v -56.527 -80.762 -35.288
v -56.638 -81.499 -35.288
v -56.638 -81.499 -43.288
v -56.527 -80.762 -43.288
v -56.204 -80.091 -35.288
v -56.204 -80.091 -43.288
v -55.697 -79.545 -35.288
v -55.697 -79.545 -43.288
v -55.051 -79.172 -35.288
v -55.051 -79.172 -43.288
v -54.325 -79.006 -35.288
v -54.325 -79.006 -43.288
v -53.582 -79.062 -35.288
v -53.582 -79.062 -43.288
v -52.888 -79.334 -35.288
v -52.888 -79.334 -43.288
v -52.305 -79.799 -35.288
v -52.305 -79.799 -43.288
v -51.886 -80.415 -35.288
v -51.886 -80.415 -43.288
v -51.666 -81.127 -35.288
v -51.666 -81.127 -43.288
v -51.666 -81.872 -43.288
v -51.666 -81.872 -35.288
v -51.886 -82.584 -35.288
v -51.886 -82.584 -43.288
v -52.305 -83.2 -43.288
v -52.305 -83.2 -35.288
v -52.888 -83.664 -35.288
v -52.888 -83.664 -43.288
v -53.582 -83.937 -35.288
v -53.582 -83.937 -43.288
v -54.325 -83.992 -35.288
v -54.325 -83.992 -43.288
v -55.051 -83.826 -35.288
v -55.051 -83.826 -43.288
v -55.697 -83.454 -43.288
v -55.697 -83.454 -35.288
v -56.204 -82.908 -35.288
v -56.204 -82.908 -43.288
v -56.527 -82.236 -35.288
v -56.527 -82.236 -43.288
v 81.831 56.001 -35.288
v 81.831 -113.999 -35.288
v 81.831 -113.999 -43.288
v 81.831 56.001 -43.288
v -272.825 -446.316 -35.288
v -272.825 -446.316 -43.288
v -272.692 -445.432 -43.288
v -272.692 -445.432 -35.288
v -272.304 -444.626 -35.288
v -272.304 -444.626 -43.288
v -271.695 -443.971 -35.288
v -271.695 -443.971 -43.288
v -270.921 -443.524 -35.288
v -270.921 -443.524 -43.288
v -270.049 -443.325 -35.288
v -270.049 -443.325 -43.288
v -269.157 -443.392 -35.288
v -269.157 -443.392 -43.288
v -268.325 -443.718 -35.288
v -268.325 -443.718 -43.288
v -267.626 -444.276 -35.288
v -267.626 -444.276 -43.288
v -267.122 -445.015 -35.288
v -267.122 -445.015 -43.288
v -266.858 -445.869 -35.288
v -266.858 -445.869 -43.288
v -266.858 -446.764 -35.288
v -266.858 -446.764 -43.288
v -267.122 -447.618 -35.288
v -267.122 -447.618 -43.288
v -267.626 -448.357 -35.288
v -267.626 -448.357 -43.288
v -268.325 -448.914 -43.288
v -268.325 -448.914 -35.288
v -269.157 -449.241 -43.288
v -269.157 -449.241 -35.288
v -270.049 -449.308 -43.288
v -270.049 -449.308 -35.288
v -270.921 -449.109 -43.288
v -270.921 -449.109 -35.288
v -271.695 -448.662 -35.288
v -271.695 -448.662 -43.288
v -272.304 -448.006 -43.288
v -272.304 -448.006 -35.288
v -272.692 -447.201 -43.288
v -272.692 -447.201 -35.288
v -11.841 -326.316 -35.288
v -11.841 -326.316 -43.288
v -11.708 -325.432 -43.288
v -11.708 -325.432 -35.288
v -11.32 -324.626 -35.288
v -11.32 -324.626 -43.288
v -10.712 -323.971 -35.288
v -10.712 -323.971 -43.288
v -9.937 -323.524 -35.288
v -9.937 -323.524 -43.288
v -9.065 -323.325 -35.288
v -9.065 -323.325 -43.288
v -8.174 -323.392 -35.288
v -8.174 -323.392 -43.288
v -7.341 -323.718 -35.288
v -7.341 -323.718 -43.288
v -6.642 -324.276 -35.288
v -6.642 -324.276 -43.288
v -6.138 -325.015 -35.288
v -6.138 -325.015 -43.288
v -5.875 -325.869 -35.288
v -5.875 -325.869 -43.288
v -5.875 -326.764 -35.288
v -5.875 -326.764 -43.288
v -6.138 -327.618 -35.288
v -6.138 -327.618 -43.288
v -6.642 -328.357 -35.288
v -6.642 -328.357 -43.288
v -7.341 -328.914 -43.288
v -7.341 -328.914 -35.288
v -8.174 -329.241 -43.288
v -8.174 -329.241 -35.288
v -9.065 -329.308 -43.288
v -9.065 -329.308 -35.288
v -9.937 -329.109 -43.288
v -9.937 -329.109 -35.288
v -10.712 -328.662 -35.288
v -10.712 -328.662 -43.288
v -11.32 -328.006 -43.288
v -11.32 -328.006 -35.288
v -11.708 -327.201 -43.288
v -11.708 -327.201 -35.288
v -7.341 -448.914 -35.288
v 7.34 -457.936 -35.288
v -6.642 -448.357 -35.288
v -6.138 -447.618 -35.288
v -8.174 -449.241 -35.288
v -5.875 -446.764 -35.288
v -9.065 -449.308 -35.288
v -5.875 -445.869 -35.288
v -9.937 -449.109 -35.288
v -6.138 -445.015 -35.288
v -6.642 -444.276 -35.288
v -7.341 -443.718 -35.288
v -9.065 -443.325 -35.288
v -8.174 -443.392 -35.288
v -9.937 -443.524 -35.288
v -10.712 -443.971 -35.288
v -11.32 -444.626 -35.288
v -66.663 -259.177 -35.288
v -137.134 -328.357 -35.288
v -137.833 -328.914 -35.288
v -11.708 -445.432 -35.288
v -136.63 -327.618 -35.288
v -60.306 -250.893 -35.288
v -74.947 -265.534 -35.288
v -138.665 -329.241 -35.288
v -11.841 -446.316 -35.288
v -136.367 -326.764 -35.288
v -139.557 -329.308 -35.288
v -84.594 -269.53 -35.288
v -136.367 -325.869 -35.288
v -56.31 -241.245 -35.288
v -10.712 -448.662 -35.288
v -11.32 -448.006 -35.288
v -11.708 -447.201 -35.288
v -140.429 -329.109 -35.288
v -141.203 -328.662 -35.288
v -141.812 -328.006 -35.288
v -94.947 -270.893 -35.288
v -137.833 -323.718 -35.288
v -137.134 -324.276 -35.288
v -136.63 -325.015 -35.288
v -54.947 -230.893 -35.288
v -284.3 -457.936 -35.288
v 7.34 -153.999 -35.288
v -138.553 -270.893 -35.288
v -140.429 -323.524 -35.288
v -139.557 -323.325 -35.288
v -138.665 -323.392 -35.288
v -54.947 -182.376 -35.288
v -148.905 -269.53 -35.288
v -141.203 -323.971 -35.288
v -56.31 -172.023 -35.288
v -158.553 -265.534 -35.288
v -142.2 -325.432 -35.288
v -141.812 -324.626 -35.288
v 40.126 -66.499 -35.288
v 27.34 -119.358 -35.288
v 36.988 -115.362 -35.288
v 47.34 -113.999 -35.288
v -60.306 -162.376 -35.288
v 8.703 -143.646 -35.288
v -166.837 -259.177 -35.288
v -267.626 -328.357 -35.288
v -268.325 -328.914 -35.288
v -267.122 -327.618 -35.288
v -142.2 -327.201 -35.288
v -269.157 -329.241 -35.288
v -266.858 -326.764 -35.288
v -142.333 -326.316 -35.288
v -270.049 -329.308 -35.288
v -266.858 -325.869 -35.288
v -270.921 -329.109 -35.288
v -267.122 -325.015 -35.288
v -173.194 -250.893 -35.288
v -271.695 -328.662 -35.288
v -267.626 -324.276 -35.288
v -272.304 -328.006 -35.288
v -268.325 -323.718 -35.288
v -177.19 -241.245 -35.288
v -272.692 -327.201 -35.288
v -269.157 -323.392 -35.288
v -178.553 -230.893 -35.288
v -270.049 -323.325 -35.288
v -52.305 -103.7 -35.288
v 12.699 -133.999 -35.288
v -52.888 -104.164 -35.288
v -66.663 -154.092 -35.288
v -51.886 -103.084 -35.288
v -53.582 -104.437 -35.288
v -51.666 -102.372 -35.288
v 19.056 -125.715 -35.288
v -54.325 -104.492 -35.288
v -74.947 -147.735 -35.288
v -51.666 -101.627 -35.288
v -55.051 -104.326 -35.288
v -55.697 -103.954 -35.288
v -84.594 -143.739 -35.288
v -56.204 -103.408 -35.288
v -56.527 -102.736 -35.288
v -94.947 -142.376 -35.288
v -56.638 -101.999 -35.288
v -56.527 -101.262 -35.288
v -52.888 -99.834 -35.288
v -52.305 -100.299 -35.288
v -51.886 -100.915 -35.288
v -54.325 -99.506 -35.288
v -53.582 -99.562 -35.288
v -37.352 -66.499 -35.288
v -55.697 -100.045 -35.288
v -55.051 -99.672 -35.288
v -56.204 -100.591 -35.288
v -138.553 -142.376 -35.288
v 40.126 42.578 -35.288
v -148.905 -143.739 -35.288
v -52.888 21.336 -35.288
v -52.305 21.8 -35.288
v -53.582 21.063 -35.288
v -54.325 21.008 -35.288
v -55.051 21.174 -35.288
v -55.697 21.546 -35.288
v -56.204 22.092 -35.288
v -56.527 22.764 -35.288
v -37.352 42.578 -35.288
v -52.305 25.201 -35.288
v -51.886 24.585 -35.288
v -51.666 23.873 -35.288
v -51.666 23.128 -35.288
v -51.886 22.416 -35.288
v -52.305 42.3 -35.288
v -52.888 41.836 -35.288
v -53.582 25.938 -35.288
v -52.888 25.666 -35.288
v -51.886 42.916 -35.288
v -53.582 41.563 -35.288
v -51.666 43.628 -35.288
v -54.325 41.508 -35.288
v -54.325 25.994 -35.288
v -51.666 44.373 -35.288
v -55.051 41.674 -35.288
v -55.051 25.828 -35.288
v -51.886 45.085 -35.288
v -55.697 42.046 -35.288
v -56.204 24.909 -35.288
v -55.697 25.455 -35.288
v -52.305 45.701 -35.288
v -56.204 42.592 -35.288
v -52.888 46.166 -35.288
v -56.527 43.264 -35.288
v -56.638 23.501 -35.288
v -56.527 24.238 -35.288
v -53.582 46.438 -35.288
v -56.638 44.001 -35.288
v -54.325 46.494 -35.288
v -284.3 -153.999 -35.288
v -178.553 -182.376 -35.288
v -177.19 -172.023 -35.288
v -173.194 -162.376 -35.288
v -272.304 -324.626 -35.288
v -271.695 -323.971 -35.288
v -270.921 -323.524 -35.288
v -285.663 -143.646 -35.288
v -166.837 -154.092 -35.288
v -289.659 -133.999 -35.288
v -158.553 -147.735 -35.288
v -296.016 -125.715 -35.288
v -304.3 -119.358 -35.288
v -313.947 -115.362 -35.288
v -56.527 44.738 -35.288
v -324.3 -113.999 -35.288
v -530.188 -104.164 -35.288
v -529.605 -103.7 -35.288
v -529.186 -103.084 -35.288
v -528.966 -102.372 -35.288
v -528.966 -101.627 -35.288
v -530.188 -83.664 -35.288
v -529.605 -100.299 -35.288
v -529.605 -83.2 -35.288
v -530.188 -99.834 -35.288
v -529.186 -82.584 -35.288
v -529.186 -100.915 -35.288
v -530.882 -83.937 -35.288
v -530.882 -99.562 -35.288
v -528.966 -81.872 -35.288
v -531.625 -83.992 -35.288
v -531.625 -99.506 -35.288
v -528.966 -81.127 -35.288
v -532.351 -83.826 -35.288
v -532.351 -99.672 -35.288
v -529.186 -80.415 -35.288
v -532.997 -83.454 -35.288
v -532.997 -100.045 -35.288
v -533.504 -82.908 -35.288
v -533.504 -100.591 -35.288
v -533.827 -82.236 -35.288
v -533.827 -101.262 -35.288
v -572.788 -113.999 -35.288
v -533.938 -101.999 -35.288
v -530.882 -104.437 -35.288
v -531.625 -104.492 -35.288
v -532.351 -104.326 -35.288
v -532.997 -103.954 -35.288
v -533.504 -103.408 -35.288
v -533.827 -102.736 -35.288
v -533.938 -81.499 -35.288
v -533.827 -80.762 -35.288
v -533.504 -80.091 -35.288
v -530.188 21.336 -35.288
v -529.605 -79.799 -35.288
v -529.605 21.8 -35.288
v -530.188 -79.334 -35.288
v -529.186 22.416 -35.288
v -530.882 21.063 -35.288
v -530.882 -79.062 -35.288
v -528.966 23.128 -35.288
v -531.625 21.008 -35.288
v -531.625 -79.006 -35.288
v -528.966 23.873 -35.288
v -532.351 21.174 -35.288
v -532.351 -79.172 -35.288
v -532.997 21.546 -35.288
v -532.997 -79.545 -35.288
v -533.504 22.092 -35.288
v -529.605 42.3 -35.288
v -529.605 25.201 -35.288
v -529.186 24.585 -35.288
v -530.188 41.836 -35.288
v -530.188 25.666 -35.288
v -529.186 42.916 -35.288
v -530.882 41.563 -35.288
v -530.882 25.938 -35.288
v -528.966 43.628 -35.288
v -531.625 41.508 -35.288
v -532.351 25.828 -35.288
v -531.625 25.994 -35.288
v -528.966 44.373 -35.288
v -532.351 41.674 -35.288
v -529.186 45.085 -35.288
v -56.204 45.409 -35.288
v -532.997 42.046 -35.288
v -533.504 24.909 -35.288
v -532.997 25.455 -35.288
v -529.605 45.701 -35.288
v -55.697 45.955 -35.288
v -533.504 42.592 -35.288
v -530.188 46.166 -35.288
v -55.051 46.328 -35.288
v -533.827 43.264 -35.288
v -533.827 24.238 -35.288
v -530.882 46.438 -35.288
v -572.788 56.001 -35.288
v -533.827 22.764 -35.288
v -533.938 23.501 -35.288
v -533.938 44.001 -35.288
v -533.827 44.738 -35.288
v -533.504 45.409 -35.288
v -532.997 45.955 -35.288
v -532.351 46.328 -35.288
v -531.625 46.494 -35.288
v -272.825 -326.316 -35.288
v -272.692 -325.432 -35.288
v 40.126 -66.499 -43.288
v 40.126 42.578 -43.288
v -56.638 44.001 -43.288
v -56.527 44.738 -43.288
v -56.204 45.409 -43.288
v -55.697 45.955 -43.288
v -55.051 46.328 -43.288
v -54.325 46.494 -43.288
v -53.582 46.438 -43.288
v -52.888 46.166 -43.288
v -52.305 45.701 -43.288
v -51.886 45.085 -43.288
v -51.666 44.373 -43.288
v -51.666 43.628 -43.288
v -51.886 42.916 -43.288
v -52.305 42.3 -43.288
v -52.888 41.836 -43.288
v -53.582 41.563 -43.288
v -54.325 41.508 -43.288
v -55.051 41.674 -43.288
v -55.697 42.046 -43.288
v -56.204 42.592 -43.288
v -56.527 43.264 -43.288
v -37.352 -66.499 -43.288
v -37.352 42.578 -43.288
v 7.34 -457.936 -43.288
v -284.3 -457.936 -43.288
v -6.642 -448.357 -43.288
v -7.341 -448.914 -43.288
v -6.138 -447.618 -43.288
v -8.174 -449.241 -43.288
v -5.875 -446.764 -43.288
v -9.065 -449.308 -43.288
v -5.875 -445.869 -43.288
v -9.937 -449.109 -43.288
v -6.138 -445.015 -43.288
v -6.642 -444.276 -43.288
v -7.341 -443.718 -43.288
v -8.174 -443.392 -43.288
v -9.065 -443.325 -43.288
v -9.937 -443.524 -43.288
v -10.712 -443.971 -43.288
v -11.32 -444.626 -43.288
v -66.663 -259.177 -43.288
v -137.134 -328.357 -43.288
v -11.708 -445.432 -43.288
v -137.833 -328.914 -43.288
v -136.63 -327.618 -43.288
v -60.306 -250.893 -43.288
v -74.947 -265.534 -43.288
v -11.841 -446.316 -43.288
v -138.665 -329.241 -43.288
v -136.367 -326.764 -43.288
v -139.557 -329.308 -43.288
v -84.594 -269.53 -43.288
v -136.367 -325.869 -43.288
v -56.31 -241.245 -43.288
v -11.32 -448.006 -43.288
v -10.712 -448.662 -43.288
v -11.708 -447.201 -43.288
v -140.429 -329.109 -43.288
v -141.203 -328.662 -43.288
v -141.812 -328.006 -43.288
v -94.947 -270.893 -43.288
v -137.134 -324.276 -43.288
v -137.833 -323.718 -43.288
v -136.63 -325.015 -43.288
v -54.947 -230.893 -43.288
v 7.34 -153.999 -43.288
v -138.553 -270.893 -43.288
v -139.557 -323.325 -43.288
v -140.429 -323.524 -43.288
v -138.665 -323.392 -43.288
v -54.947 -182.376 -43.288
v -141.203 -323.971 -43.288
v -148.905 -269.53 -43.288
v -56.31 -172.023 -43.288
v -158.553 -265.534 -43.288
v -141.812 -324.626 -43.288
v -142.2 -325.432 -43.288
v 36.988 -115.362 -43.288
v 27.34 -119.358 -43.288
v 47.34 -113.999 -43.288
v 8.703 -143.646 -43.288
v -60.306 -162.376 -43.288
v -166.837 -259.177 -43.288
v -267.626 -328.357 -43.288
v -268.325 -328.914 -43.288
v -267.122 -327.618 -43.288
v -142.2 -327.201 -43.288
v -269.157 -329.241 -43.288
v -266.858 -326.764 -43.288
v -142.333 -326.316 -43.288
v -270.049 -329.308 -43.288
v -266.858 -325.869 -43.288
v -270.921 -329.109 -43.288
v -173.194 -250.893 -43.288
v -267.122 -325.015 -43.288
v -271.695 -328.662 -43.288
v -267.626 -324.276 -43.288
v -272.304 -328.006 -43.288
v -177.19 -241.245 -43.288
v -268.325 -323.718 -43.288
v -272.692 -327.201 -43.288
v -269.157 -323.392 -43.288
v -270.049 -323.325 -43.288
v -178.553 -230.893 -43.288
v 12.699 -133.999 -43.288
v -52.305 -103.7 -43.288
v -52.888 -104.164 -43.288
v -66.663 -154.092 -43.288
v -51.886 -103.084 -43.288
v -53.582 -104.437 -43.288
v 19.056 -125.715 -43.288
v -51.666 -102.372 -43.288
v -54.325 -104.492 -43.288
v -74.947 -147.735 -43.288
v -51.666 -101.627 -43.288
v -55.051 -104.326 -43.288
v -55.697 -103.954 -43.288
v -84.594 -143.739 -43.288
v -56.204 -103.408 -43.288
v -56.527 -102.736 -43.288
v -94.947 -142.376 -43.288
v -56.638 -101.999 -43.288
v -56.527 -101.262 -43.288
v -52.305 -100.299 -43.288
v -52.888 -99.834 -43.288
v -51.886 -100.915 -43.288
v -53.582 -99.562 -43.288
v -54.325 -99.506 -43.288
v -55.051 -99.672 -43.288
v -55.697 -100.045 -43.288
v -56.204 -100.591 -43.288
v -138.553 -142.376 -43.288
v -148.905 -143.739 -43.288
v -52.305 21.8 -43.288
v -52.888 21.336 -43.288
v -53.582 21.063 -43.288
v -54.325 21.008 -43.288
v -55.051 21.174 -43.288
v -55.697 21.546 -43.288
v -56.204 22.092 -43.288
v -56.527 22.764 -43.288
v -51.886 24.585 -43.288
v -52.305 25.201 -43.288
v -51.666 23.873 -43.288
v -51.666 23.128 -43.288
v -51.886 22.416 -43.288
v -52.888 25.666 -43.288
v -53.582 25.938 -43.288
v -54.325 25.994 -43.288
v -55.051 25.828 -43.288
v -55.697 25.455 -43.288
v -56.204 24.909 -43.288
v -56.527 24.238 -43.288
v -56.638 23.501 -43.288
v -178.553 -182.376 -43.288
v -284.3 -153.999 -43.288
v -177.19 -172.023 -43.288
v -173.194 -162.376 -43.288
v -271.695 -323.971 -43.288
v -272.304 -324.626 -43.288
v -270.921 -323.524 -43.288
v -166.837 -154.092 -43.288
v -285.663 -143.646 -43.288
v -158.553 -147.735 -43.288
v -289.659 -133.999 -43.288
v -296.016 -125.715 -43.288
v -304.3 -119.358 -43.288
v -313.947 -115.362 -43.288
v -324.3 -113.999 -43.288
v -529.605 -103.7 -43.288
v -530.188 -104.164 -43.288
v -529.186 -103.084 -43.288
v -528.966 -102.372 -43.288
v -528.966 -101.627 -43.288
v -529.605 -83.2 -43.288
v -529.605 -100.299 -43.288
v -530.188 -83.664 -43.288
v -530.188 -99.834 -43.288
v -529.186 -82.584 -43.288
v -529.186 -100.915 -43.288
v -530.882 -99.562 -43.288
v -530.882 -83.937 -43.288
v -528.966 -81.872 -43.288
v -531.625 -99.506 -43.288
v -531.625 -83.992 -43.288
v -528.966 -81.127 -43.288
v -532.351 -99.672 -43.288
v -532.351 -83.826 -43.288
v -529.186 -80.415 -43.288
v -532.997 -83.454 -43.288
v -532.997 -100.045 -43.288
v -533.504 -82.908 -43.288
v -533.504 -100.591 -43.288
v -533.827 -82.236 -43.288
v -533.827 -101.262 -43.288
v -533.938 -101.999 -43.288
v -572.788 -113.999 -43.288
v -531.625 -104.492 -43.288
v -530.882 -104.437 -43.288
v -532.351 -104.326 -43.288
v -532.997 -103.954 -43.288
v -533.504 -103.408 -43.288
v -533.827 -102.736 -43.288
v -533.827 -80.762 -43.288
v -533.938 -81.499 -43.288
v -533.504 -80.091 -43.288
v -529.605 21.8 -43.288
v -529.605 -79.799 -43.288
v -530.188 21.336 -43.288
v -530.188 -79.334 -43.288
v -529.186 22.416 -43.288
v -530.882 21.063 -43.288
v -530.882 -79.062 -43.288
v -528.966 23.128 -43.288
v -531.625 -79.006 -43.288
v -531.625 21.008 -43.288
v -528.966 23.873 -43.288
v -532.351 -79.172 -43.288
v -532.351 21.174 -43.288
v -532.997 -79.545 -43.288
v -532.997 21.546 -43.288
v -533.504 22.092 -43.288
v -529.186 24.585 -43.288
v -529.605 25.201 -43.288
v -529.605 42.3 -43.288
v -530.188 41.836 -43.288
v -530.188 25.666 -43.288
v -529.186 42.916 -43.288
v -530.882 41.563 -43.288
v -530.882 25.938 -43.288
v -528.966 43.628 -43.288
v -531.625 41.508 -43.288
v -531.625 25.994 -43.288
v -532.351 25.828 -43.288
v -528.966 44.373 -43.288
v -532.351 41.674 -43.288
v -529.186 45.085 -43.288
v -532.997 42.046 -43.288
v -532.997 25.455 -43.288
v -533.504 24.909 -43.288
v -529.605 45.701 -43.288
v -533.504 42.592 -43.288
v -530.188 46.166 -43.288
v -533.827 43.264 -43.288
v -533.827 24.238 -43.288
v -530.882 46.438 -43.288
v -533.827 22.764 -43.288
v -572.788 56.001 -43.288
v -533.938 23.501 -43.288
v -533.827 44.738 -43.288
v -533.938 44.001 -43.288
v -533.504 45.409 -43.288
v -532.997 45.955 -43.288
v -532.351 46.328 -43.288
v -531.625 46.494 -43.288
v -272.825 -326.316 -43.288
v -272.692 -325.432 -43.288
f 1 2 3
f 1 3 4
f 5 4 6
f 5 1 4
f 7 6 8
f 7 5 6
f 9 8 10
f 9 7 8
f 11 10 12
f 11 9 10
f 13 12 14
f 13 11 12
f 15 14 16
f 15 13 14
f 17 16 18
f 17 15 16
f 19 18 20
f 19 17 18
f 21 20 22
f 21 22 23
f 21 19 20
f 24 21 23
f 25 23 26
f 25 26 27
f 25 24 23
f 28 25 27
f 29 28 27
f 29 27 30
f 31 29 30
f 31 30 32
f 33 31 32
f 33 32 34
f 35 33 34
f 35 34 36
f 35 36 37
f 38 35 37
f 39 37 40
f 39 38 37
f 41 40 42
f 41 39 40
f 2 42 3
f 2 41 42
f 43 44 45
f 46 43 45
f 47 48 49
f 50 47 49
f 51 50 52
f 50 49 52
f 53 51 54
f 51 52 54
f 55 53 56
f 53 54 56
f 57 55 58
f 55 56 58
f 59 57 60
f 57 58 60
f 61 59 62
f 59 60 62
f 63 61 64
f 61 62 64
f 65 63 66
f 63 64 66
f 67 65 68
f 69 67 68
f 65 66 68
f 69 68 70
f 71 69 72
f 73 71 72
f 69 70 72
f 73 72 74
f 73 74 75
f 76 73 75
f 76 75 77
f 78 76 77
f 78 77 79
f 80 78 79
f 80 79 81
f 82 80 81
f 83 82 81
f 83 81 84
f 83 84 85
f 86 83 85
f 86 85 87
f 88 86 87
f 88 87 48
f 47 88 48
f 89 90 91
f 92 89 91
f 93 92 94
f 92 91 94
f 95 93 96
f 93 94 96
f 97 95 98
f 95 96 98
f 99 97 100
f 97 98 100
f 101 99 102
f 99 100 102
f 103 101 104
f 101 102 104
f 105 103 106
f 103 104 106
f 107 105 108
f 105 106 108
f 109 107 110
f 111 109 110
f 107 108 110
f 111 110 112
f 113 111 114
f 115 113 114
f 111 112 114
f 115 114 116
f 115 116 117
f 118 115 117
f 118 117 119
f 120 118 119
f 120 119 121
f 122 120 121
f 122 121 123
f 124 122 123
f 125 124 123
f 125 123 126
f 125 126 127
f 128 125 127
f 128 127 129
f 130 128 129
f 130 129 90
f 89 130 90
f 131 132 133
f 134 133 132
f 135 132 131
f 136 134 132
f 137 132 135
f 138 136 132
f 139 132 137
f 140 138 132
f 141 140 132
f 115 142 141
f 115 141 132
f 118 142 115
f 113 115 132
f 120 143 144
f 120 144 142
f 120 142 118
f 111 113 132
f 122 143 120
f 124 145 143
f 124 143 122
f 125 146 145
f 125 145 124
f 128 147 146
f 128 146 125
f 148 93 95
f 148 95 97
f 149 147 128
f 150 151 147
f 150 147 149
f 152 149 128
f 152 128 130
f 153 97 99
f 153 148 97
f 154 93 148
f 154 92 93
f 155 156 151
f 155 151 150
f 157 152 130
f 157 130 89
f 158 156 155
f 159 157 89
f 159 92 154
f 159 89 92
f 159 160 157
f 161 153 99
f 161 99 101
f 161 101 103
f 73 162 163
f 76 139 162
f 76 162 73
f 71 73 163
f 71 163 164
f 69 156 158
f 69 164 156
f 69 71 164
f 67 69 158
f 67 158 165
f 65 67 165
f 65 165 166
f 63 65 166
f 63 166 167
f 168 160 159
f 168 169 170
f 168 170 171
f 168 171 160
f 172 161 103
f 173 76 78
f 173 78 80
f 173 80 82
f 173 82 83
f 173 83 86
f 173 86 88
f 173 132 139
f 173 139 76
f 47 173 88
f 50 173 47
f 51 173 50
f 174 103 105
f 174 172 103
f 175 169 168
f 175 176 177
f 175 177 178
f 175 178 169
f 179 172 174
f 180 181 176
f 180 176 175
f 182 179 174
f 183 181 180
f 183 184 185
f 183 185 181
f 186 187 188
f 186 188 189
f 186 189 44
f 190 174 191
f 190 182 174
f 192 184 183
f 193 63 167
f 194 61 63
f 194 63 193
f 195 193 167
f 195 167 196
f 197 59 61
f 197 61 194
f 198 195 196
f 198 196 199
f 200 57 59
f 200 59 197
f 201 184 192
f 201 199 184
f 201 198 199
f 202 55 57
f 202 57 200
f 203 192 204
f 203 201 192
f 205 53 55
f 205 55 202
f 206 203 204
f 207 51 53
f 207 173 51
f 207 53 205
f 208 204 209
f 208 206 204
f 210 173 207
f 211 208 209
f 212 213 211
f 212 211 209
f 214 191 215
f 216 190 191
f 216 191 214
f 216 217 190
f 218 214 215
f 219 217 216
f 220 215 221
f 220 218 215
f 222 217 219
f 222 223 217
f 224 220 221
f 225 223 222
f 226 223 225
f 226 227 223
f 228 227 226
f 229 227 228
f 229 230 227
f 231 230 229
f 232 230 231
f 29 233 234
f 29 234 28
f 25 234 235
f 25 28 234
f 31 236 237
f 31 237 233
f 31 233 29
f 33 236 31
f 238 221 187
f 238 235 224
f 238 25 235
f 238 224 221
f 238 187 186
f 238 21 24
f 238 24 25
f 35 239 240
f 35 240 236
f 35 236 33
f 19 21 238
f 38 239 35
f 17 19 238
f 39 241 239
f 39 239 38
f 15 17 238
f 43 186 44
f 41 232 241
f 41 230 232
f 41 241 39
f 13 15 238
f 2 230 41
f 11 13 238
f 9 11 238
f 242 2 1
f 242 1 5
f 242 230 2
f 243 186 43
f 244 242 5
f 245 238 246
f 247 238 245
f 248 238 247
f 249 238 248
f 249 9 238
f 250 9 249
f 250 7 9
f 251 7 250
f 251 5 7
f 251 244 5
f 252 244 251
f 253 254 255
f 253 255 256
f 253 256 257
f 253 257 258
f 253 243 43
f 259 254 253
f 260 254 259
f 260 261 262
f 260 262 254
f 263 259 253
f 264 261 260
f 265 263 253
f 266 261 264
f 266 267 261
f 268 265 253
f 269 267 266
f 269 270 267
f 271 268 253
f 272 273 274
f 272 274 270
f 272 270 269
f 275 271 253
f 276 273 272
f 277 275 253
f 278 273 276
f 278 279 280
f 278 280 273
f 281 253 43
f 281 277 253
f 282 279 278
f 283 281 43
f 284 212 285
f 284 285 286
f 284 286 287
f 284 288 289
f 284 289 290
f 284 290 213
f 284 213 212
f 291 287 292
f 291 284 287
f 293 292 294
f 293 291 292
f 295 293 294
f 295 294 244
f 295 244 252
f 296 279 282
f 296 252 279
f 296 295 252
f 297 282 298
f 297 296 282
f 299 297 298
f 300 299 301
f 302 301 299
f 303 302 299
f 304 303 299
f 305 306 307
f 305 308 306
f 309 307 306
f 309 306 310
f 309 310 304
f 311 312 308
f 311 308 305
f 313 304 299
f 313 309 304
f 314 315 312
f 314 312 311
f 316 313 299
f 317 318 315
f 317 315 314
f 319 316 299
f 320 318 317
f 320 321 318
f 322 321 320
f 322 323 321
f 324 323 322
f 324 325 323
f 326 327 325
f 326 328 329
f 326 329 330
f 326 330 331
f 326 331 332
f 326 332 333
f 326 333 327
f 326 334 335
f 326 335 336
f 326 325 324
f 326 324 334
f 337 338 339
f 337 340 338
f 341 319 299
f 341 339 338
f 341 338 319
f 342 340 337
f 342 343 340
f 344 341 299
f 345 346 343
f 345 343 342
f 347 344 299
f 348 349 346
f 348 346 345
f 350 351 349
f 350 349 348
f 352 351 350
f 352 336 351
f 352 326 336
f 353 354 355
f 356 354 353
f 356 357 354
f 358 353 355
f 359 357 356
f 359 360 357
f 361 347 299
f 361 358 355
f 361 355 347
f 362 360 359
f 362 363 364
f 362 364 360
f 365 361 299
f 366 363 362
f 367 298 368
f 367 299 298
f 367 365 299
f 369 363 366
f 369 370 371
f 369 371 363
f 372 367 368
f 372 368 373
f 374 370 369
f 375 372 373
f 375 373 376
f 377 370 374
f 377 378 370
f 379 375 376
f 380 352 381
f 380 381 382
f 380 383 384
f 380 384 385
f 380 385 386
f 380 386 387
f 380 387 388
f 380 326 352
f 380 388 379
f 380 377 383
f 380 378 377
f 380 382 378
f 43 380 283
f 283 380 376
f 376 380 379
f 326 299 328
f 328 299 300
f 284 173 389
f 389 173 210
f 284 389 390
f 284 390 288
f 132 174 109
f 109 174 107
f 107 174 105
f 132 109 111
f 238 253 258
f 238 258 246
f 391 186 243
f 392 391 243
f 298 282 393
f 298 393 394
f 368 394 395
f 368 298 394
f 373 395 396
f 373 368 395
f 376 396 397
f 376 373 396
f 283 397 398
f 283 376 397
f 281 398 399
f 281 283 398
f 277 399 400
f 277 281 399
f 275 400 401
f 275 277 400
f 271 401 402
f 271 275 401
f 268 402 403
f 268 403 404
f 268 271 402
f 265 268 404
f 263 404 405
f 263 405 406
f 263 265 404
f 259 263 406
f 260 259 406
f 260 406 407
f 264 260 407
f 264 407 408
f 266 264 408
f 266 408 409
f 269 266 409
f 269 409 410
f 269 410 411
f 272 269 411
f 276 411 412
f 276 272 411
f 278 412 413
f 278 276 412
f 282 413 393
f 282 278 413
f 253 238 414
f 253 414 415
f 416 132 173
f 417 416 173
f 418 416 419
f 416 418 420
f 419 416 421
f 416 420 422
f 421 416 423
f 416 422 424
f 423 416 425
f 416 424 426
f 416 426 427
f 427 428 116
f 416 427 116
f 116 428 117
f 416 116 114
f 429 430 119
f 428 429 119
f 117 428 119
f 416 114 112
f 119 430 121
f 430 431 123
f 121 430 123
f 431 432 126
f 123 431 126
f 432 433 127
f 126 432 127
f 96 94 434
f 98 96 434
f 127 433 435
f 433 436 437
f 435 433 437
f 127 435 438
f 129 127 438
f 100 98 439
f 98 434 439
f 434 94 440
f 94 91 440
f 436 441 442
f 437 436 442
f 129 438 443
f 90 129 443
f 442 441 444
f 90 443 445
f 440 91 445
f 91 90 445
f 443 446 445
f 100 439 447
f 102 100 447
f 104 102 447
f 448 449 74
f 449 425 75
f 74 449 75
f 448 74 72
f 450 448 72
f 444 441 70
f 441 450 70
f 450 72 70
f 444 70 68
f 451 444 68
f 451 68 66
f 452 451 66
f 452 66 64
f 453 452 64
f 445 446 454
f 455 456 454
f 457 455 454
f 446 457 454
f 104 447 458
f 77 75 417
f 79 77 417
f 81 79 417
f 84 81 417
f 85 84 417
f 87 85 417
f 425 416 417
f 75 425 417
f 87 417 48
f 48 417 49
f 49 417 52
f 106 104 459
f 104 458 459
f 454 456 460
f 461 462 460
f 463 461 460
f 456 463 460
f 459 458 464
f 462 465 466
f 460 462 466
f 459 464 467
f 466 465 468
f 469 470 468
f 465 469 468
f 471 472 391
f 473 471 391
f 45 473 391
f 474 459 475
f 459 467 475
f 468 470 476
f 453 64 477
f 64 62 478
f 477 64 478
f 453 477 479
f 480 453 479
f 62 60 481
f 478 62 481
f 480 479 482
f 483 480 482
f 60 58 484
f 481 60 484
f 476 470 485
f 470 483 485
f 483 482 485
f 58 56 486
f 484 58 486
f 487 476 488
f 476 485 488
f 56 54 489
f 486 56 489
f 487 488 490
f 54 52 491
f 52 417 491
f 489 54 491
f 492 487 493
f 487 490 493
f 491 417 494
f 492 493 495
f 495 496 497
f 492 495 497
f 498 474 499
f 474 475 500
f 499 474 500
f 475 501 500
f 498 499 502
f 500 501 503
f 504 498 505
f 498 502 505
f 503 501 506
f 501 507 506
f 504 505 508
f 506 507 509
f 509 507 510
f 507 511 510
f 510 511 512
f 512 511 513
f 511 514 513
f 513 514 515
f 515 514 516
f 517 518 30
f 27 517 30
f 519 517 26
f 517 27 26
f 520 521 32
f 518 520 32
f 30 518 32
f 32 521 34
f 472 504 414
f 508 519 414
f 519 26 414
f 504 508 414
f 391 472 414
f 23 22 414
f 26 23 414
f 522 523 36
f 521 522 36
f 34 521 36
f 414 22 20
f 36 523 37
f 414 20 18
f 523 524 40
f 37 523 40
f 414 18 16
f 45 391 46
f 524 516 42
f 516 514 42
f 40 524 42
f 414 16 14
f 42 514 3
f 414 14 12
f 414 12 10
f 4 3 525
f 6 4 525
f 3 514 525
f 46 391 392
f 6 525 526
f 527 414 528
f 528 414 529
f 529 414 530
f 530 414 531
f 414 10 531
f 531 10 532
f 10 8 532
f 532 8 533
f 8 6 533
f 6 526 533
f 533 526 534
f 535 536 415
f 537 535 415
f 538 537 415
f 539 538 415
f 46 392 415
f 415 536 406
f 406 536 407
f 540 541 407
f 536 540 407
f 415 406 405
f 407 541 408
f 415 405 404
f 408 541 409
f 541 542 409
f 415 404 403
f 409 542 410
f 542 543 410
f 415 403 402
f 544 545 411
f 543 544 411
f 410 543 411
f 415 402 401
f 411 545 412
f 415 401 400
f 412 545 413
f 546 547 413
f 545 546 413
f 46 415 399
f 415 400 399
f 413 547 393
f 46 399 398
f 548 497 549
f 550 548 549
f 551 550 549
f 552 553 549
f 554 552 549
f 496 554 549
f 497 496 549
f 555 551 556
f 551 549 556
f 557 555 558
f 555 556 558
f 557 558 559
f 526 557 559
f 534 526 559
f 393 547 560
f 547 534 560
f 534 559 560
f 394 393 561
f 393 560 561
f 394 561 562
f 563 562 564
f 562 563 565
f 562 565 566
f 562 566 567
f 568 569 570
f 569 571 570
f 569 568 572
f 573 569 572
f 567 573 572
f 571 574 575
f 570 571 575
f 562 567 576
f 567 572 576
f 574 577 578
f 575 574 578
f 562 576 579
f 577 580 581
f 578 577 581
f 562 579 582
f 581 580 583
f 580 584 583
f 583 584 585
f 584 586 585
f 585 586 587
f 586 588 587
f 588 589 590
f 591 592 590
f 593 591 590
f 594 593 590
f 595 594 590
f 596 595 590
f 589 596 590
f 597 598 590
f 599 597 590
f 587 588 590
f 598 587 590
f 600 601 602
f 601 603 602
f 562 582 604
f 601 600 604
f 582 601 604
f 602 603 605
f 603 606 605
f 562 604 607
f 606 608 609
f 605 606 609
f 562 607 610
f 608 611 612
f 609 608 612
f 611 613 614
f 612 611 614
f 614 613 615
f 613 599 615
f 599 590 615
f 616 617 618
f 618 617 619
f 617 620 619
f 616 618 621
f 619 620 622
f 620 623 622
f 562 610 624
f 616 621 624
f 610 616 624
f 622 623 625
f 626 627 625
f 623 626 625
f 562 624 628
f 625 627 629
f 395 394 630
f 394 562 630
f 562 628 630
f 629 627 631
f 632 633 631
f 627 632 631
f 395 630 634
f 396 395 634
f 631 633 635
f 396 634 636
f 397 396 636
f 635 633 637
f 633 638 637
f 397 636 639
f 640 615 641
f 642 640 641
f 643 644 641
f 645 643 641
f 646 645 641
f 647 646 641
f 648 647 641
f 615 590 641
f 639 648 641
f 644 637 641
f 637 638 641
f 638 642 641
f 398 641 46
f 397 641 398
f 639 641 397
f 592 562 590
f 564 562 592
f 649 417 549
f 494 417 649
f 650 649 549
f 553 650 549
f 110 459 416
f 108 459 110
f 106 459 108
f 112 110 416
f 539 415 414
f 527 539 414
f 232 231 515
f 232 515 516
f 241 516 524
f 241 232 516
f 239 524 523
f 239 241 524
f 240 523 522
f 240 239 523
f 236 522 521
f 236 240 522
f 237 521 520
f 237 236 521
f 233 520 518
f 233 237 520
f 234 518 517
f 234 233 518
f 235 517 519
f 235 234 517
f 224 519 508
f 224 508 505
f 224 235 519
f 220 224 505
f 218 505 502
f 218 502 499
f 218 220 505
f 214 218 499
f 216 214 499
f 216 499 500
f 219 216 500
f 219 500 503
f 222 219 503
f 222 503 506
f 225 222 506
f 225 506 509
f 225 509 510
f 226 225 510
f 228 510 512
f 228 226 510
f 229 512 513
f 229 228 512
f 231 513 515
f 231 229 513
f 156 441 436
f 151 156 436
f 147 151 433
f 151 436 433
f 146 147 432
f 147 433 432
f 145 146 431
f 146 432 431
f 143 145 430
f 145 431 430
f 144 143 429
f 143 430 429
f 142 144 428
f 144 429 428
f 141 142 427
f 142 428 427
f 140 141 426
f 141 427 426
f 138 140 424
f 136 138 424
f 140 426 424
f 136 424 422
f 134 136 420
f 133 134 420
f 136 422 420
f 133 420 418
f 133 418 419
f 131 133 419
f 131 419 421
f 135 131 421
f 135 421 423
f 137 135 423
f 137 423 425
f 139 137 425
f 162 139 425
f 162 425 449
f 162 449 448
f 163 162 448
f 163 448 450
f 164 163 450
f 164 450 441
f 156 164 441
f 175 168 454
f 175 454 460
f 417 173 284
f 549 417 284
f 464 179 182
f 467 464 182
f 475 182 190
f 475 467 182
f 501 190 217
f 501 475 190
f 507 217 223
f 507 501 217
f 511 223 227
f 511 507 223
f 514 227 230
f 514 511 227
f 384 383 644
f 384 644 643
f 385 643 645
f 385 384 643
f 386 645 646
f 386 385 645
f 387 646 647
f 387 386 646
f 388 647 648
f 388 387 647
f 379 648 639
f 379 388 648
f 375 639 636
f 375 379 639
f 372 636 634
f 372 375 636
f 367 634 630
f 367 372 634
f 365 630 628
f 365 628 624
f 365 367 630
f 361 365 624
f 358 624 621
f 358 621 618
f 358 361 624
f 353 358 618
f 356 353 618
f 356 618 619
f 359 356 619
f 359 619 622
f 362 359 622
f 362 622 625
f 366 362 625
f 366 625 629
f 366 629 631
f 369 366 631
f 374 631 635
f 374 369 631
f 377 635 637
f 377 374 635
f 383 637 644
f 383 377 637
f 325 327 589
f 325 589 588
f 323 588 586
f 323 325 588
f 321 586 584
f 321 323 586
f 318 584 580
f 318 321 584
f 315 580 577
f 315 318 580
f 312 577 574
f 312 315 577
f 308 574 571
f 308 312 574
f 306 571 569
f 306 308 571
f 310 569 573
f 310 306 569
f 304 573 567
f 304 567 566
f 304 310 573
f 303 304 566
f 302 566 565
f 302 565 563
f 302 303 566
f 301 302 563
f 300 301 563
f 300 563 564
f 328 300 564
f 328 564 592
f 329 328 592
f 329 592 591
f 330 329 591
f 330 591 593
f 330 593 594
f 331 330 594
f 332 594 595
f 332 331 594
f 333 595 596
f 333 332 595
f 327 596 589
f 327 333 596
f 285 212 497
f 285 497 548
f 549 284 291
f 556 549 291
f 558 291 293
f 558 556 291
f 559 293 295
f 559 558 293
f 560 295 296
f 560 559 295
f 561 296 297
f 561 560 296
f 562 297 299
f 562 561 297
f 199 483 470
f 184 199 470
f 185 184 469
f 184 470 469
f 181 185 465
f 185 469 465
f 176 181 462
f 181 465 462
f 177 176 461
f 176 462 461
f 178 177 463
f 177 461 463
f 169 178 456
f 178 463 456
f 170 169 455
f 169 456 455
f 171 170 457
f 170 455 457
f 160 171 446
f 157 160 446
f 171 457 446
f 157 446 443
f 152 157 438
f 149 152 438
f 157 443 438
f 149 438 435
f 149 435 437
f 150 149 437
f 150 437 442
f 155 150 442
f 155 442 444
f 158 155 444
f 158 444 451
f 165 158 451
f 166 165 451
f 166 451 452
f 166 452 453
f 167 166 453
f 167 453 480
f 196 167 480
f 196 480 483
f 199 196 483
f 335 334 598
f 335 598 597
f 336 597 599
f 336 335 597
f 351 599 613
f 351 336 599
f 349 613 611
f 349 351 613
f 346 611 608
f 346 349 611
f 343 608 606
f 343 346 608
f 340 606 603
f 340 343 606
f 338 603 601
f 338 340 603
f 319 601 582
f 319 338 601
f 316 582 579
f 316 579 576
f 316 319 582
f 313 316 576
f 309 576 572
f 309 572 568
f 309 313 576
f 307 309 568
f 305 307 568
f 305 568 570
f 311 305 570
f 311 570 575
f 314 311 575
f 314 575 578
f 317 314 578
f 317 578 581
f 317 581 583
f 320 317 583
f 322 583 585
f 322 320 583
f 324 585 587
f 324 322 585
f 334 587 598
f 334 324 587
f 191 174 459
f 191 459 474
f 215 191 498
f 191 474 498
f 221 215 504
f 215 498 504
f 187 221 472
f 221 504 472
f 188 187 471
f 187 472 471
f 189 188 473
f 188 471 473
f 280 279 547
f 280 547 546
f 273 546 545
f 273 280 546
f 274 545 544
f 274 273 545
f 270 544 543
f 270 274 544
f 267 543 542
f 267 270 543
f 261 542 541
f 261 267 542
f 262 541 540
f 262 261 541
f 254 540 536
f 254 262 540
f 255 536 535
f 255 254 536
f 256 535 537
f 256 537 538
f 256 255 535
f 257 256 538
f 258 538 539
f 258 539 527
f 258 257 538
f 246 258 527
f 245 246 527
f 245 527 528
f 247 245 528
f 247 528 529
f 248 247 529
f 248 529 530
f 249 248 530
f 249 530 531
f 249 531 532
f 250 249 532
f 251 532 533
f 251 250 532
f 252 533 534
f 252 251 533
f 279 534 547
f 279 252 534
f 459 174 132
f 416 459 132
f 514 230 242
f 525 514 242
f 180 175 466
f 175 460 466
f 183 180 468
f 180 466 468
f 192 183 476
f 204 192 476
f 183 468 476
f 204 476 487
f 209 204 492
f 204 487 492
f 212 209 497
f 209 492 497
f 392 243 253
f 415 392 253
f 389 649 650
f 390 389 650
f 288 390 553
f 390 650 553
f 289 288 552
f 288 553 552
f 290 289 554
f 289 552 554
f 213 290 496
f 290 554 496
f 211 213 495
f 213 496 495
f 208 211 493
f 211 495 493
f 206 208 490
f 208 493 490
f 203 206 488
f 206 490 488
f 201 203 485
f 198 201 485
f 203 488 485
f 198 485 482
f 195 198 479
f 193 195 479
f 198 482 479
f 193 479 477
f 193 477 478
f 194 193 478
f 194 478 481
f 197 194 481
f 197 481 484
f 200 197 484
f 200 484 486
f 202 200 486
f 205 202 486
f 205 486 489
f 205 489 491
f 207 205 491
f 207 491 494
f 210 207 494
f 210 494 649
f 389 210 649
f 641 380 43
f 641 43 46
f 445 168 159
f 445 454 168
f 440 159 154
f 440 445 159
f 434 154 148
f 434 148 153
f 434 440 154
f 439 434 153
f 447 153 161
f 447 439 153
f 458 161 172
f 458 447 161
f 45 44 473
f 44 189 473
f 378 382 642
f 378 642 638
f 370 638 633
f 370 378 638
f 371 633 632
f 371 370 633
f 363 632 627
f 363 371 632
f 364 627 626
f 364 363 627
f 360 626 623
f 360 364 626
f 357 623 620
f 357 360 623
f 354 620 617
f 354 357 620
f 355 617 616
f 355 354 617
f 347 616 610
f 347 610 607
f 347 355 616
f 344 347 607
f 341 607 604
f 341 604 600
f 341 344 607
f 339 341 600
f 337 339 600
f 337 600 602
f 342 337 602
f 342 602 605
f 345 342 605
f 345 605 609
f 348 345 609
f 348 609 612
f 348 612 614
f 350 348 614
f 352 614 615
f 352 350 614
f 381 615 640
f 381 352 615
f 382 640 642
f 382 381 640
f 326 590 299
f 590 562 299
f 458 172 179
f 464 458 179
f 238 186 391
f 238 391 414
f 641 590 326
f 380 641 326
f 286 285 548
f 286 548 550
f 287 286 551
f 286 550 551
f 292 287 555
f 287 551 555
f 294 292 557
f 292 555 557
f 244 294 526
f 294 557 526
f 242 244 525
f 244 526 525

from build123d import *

# Parameters (mm, degrees)
CROQUIS1_R              = 2.5
CROQUIS1_W              = 77.478408342
CROQUIS1_H              = 109.077461589
CROQUIS1_W_2            = 123.605310211
CROQUIS1_H_2            = 128.516462854
SALIENTE_EXTRUIR1_DEPTH = 8
REDONDEO1_R             = 40
CROQUIS2_W              = 8
CROQUIS2_H              = 170
SALIENTE_EXTRUIR2_DEPTH = 5
CROQUIS3_W              = 8
CROQUIS3_H              = 170
SALIENTE_EXTRUIR3_DEPTH = 30
CROQUIS4_W              = 8
CROQUIS4_H              = 170
SALIENTE_EXTRUIR4_DEPTH = 30
CROQUIS5_R              = 3
CORTAR_EXTRUIR1_DEPTH   = 30


with BuildPart() as part:
    # Croquis1 → Saliente-Extruir1 (new body)
    with BuildSketch(Plane(origin=(0, 0, -35.287768798), x_dir=(-1, 0, 0), z_dir=(0, 0, -1))):
        Polygon((537.787991057, -113.999224426), (537.787991057, 56.000775574), (-51.831359741, 56.000775574), (-51.831359741, -113.999224426), (-7.340270166, -113.999224426), (-7.340270166, -457.935763063), (284.299805756, -457.935763063), (284.299805756, -113.999224426), align=None)
        with Locations((531.437991057, -101.999224426)):
            Circle(CROQUIS1_R, mode=Mode.SUBTRACT)
        with Locations((531.437991057, -81.499224426)):
            Circle(CROQUIS1_R, mode=Mode.SUBTRACT)
        with Locations((531.437991057, 23.500775574)):
            Circle(CROQUIS1_R, mode=Mode.SUBTRACT)
        with Locations((531.437991057, 44.000775574)):
            Circle(CROQUIS1_R, mode=Mode.SUBTRACT)
        with Locations((54.137991057, 44.000775574)):
            Circle(CROQUIS1_R, mode=Mode.SUBTRACT)
        with Locations((54.137991057, -101.999224426)):
            Circle(CROQUIS1_R, mode=Mode.SUBTRACT)
        with Locations((54.137991057, -81.499224426)):
            Circle(CROQUIS1_R, mode=Mode.SUBTRACT)
        with Locations((-1.387076296, -11.960493631)):
            Rectangle(CROQUIS1_W, CROQUIS1_H, mode=Mode.SUBTRACT)
        with Locations((54.137991057, 23.500775574)):
            Circle(CROQUIS1_R, mode=Mode.SUBTRACT)
        with Locations((116.749910344, -206.634344557)):
            Rectangle(CROQUIS1_W_2, CROQUIS1_H_2, mode=Mode.SUBTRACT)
    extrude(amount=SALIENTE_EXTRUIR1_DEPTH)

    # Redondeo1
    redondeo1_edges = [part.edges().sort_by_distance(p)[0] for p in [
        (-54.947255239, -270.892575984, -39.287768798),
        (-178.55256545, -270.892575984, -39.287768798),
        (-178.55256545, -142.37611313, -39.287768798),
        (-54.947255239, -142.37611313, -39.287768798),
        (7.340270166, -113.999224426, -39.287768798),
        (-284.299805756, -113.999224426, -39.287768798),
    ]]
    fillet(redondeo1_edges, radius=REDONDEO1_R)

    # Croquis2 → Saliente-Extruir2 (add)
    with BuildSketch(Plane.ZY.offset(537.787991057)):
        with Locations((-39.287768798, -28.999224426)):
            Rectangle(CROQUIS2_W, CROQUIS2_H)
    extrude(amount=SALIENTE_EXTRUIR2_DEPTH)

    # Croquis3 → Saliente-Extruir3 (add)
    with BuildSketch(Plane.ZY.offset(542.787991057)):
        with Locations((-39.287768798, -28.999224426)):
            Rectangle(CROQUIS3_W, CROQUIS3_H)
    extrude(amount=SALIENTE_EXTRUIR3_DEPTH)

    # Croquis4 → Saliente-Extruir4 (add)
    with BuildSketch(Plane(origin=(51.831359741, 0, 0), x_dir=(0, 0, -1), z_dir=(1, 0, 0))):
        with Locations((39.287768798, -28.999224426)):
            Rectangle(CROQUIS4_W, CROQUIS4_H)
    extrude(amount=SALIENTE_EXTRUIR4_DEPTH)

    # Croquis5 → Cortar-Extruir1 (cut)
    with BuildSketch(Plane(origin=(0, 0, -43.287768798), x_dir=(-1, 0, 0), z_dir=(0, 0, -1))):
        with Locations((8.841068429, -446.316406302)):
            Circle(CROQUIS5_R)
        with Locations((8.841068429, -326.316406302)):
            Circle(CROQUIS5_R)
        with Locations((139.33299328, -326.316406302)):
            Circle(CROQUIS5_R)
        with Locations((269.824918132, -326.316406302)):
            Circle(CROQUIS5_R)
        with Locations((269.824918132, -446.316406302)):
            Circle(CROQUIS5_R)
    extrude(amount=-CORTAR_EXTRUIR1_DEPTH, mode=Mode.SUBTRACT)


solid = part.part
